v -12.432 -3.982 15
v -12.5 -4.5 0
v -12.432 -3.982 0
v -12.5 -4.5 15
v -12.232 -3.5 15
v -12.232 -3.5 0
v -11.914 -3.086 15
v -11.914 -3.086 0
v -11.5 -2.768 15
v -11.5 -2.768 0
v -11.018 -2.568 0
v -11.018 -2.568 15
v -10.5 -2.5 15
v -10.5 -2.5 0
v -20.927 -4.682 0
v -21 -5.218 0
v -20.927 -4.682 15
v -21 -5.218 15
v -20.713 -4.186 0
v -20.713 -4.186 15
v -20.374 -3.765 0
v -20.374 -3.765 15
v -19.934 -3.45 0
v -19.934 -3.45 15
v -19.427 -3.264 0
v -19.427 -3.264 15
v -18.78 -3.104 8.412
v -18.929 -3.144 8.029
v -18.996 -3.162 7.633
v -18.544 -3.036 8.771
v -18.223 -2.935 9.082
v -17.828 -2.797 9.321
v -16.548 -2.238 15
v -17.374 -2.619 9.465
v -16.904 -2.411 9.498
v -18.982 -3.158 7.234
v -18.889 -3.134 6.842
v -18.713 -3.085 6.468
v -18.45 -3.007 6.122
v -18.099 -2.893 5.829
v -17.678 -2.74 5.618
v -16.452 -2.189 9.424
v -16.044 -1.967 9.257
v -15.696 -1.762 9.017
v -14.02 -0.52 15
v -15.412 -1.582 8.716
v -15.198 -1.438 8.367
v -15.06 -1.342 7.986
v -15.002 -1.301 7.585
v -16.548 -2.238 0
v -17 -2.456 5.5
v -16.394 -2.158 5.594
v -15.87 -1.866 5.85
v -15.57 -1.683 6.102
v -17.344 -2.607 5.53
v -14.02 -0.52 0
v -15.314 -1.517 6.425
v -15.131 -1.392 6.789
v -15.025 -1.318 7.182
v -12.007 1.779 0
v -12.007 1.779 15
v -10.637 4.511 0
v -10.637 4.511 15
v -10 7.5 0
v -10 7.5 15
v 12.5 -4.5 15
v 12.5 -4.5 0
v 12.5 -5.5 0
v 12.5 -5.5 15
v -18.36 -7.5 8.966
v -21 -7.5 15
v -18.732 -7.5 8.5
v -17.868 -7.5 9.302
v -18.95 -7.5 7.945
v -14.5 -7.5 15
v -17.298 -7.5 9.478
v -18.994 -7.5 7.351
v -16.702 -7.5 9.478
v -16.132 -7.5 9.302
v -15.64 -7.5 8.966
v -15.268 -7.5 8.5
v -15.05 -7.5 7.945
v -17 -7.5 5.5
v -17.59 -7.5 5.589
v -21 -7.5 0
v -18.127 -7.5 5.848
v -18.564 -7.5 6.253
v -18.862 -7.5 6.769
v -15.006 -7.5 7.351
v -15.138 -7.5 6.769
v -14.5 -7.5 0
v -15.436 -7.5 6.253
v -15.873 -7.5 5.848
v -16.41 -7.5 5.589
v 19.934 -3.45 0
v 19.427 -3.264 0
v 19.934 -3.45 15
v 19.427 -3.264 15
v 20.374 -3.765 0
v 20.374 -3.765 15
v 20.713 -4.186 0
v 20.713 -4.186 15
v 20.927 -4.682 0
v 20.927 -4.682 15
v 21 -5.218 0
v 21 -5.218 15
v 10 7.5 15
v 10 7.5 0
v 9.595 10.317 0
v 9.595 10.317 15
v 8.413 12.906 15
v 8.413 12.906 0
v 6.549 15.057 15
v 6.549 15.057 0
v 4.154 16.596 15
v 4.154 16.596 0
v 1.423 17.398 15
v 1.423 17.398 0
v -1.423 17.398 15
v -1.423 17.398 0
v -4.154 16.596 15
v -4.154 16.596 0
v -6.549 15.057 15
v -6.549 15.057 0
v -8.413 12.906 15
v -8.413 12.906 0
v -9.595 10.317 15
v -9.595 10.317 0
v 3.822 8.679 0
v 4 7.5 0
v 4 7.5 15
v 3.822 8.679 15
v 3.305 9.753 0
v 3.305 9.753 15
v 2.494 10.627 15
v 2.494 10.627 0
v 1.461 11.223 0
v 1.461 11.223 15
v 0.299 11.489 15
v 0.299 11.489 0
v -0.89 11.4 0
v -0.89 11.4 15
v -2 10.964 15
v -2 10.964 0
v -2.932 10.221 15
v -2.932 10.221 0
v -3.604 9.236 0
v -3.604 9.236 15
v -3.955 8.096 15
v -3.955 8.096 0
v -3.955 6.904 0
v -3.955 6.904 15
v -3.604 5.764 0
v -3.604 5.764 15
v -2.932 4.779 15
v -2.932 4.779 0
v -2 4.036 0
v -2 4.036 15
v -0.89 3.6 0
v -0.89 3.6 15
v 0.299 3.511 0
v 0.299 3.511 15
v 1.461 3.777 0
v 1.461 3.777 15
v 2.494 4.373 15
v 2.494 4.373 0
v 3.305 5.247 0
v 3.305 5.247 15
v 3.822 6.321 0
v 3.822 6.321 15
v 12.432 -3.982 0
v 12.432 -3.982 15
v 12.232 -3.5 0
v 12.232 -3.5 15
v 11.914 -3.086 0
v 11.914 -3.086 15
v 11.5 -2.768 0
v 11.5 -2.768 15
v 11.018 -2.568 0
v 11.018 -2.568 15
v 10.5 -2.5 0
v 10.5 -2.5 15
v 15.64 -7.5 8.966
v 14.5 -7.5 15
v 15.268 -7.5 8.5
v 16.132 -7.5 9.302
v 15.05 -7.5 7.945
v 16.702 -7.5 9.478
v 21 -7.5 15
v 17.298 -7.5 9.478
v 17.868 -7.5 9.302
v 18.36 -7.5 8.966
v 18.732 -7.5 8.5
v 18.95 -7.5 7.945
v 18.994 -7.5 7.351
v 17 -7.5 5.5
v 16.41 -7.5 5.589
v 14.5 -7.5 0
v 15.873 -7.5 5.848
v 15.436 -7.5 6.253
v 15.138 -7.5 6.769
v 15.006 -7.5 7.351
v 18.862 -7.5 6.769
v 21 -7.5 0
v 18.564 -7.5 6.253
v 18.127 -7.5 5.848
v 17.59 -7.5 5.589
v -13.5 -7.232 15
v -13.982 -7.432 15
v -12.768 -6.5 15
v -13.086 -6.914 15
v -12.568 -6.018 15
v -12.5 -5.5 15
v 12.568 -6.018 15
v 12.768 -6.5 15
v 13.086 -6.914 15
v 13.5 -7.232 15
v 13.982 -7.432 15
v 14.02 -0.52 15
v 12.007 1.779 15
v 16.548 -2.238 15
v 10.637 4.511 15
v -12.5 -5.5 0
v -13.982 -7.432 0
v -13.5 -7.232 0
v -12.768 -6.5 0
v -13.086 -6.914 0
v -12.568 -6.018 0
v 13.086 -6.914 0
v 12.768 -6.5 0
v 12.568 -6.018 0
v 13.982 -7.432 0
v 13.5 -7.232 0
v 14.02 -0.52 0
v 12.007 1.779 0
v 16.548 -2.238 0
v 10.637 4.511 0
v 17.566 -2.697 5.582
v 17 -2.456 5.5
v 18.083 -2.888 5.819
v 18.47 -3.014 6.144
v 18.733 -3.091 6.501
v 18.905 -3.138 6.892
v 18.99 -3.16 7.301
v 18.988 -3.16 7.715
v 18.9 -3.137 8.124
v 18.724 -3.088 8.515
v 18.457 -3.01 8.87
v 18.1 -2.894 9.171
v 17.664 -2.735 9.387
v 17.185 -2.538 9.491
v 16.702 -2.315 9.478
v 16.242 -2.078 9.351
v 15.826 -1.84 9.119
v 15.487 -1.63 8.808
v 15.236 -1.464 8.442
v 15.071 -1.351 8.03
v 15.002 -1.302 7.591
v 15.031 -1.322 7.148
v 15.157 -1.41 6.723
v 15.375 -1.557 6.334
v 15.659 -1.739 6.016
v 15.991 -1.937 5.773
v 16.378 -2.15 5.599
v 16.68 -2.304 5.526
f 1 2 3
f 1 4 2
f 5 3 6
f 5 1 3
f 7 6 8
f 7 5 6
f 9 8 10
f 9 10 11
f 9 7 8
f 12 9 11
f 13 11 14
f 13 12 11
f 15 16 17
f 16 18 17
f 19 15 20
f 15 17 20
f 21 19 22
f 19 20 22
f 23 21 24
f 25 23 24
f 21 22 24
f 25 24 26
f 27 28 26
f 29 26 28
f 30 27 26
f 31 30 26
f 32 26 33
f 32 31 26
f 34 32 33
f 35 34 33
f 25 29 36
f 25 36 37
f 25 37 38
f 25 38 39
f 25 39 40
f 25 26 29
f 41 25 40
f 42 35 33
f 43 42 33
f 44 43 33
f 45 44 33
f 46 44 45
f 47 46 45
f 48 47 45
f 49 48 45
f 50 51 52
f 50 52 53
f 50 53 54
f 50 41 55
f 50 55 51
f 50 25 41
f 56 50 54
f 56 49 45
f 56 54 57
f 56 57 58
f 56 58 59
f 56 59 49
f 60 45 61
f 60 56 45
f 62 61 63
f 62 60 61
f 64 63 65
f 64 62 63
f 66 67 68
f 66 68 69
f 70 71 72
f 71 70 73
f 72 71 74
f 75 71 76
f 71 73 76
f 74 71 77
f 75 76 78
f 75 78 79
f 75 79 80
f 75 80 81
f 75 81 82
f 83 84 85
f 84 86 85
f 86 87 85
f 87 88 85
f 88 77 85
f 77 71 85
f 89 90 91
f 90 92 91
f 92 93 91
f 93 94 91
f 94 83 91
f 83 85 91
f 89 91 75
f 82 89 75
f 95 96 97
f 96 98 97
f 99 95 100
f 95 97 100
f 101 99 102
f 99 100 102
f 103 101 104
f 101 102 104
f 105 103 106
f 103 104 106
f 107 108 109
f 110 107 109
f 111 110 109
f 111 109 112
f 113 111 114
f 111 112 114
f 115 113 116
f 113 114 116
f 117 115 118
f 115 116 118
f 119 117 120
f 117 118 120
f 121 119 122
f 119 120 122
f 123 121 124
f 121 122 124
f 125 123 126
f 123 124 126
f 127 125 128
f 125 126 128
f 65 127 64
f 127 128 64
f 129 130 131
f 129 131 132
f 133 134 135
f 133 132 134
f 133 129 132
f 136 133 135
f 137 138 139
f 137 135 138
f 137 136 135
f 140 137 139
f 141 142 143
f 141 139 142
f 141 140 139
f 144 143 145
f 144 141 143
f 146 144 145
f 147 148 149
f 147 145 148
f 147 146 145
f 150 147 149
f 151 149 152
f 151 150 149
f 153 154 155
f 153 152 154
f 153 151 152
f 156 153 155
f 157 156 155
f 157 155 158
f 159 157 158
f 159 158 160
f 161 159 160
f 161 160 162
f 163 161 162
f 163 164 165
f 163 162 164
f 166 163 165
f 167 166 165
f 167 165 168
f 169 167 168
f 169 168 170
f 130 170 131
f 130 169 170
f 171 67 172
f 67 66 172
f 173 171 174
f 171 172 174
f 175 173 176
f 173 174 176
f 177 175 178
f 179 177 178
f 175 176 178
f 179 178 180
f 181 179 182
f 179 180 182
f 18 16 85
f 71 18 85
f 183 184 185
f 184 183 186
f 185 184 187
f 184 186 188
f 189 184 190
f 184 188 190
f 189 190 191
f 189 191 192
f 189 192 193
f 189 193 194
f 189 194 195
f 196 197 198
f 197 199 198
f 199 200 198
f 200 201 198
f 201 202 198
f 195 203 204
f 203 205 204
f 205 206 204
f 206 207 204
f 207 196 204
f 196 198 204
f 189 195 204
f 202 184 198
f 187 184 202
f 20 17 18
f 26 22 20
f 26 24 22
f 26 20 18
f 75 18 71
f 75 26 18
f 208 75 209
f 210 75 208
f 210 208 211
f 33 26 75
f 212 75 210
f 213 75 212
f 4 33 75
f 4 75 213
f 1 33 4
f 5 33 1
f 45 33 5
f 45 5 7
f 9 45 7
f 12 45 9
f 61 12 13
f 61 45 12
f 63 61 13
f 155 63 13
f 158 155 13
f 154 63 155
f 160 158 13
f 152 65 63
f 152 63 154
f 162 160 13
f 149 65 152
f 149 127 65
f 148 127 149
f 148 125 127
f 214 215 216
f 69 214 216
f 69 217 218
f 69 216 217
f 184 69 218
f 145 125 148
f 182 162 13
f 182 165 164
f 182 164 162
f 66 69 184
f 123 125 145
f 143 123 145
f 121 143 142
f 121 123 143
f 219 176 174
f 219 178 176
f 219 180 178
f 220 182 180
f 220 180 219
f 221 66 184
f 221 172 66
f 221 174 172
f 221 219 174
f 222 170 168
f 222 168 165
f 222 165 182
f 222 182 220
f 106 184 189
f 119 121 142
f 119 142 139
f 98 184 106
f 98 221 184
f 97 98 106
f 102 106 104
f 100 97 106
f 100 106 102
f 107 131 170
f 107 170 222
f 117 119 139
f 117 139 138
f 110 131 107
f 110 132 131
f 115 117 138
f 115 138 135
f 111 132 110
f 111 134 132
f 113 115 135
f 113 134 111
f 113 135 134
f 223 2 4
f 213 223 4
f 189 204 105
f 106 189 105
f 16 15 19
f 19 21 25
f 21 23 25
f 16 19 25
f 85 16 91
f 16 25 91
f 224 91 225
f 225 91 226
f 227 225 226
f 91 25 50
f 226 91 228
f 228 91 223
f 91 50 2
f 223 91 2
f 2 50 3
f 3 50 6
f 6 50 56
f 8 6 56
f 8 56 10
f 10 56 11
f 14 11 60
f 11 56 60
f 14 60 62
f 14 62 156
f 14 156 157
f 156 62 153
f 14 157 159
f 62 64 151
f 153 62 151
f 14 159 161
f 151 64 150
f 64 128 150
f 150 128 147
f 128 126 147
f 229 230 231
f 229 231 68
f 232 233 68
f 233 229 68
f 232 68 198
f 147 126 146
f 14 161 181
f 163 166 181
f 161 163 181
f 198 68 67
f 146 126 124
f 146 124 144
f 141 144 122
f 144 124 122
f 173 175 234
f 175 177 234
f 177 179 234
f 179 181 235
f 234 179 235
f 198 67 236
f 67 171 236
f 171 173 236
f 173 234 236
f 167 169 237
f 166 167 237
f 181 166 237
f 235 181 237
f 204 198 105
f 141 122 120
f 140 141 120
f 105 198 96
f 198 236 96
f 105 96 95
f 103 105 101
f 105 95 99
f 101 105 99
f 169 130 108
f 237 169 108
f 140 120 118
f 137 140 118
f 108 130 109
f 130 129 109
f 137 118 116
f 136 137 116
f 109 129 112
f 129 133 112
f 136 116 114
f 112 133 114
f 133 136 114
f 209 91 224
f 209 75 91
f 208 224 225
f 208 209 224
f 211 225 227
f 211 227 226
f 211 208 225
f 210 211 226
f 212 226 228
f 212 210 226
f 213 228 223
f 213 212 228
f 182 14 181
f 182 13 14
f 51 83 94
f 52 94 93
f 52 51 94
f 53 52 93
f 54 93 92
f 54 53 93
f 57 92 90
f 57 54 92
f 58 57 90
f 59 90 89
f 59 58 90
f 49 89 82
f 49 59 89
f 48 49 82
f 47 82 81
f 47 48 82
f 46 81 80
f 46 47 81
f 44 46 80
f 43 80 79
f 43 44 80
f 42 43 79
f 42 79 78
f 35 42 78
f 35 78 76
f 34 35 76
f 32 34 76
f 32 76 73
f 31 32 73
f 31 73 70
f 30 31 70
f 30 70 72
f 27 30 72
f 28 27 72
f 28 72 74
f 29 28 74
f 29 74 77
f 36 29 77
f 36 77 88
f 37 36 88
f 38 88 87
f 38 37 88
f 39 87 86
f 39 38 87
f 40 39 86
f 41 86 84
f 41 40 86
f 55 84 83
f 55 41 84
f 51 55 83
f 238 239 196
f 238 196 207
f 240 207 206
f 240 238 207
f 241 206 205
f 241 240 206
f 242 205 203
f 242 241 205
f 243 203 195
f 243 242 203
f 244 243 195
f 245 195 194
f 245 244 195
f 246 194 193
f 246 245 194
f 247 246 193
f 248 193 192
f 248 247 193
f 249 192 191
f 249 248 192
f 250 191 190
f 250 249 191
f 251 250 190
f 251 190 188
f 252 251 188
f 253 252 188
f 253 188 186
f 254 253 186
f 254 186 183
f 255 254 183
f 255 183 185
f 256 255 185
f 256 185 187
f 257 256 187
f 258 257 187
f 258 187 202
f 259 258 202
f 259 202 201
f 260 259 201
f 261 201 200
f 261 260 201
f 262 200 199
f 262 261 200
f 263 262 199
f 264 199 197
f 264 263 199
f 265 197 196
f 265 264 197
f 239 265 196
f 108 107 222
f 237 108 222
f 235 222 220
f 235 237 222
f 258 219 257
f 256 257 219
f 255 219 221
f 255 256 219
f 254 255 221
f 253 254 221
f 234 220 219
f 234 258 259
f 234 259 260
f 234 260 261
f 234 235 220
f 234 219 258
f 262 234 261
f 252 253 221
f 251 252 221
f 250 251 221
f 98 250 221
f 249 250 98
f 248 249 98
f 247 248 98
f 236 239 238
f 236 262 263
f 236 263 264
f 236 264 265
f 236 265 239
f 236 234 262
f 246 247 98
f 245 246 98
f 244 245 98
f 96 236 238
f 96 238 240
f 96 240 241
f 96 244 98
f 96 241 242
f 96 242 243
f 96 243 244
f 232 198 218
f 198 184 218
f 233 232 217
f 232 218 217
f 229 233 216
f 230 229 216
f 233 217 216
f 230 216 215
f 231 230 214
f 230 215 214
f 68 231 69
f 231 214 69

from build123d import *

# Parameters (mm, degrees)
BOSS_EXTRUDE1_DEPTH     = 15
CUT_EXTRUDE1_DEPTH      = 32.180923655
CUT_EXTRUDE1_DEPTH_BACK = 32.180923655
SKETCH2_R               = 4
CUT_EXTRUDE2_DEPTH      = 32.180923655
CUT_EXTRUDE2_DEPTH_BACK = 32.180923655
CUT_EXTRUDE3_DEPTH      = 36.930488446
CUT_EXTRUDE3_DEPTH_BACK = 36.930488446
SKETCH5_R               = 2
CUT_EXTRUDE4_DEPTH      = 36.930488547
CUT_EXTRUDE4_DEPTH_BACK = 5
SKETCH7_W               = 25
SKETCH7_H               = 15
FILLET1_R               = 2


with BuildPart() as part:
    # Sketch1 → Boss-Extrude1 (new body)
    with BuildSketch(Plane.XY):
        with BuildLine():
            Line((-21, -7.5), (21, -7.5))
            Line((21, -7.5), (21, 7.5))
            Line((21, 7.5), (10, 7.5))
            ThreePointArc((10, 7.5), (0, 17.5), (-10, 7.5))
            Line((-10, 7.5), (-21, 7.5))
            Line((-21, 7.5), (-21, -7.5))
        make_face()
    extrude(amount=BOSS_EXTRUDE1_DEPTH)

    # Sketch2 → Cut-Extrude1 (cut, two sides: drawn at the far end of the back side and taken through both)
    with BuildSketch(Plane.XY.offset(15).offset(-CUT_EXTRUDE1_DEPTH_BACK)):
        with Locations((0, 7.5)):
            Circle(SKETCH2_R)
    extrude(amount=CUT_EXTRUDE1_DEPTH + CUT_EXTRUDE1_DEPTH_BACK, mode=Mode.SUBTRACT)

    # Sketch4 → Cut-Extrude2 (cut, two sides: drawn at the far end of the back side and taken through both)
    with BuildSketch(Plane.XY.offset(15).offset(-CUT_EXTRUDE2_DEPTH_BACK)):
        with BuildLine():
            ThreePointArc((-21, -3.5), (-13.484032178, -0.015967822), (-10, 7.5))
            Line((-10, 7.5), (-21, 7.5))
            Line((-21, 7.5), (-21, -3.5))
        make_face()
        with BuildLine():
            Line((21, 7.5), (10, 7.5))
            ThreePointArc((10, 7.5), (13.484032178, -0.015967822), (21, -3.5))
            Line((21, -3.5), (21, 7.5))
        make_face()
    extrude(amount=CUT_EXTRUDE2_DEPTH + CUT_EXTRUDE2_DEPTH_BACK, mode=Mode.SUBTRACT)

    # Sketch5 → Cut-Extrude3 (cut, two sides: drawn at the far end of the back side and taken through both)
    with BuildSketch(Plane.XZ.offset(7.5).offset(-CUT_EXTRUDE3_DEPTH_BACK)):
        with Locations(Location((-17, 7.5, 0), (0, 0, 270))):
            Circle(SKETCH5_R)
        with Locations(Location((17, 7.5, 0), (0, 0, 270))):
            Circle(SKETCH5_R)
    extrude(amount=CUT_EXTRUDE3_DEPTH + CUT_EXTRUDE3_DEPTH_BACK, mode=Mode.SUBTRACT)

    # Sketch7 → Cut-Extrude4 (cut, two sides: drawn at the far end of the back side and taken through both)
    with BuildSketch(Plane.XZ.offset(7.5).offset(-CUT_EXTRUDE4_DEPTH_BACK)):
        with Locations((0, 7.5)):
            Rectangle(SKETCH7_W, SKETCH7_H)
    extrude(amount=CUT_EXTRUDE4_DEPTH + CUT_EXTRUDE4_DEPTH_BACK, mode=Mode.SUBTRACT)

    # Fillet1
    fillet1_edges = [part.edges().sort_by_distance(p)[0] for p in [
        (-21, -3.5, 7.5),
        (21, -3.5, 7.5),
        (12.5, -2.5, 7.5),
        (-12.5, -2.5, 7.5),
        (12.5, -7.5, 7.5),
        (-12.5, -7.5, 7.5),
    ]]
    fillet(fillet1_edges, radius=FILLET1_R)


solid = part.part
